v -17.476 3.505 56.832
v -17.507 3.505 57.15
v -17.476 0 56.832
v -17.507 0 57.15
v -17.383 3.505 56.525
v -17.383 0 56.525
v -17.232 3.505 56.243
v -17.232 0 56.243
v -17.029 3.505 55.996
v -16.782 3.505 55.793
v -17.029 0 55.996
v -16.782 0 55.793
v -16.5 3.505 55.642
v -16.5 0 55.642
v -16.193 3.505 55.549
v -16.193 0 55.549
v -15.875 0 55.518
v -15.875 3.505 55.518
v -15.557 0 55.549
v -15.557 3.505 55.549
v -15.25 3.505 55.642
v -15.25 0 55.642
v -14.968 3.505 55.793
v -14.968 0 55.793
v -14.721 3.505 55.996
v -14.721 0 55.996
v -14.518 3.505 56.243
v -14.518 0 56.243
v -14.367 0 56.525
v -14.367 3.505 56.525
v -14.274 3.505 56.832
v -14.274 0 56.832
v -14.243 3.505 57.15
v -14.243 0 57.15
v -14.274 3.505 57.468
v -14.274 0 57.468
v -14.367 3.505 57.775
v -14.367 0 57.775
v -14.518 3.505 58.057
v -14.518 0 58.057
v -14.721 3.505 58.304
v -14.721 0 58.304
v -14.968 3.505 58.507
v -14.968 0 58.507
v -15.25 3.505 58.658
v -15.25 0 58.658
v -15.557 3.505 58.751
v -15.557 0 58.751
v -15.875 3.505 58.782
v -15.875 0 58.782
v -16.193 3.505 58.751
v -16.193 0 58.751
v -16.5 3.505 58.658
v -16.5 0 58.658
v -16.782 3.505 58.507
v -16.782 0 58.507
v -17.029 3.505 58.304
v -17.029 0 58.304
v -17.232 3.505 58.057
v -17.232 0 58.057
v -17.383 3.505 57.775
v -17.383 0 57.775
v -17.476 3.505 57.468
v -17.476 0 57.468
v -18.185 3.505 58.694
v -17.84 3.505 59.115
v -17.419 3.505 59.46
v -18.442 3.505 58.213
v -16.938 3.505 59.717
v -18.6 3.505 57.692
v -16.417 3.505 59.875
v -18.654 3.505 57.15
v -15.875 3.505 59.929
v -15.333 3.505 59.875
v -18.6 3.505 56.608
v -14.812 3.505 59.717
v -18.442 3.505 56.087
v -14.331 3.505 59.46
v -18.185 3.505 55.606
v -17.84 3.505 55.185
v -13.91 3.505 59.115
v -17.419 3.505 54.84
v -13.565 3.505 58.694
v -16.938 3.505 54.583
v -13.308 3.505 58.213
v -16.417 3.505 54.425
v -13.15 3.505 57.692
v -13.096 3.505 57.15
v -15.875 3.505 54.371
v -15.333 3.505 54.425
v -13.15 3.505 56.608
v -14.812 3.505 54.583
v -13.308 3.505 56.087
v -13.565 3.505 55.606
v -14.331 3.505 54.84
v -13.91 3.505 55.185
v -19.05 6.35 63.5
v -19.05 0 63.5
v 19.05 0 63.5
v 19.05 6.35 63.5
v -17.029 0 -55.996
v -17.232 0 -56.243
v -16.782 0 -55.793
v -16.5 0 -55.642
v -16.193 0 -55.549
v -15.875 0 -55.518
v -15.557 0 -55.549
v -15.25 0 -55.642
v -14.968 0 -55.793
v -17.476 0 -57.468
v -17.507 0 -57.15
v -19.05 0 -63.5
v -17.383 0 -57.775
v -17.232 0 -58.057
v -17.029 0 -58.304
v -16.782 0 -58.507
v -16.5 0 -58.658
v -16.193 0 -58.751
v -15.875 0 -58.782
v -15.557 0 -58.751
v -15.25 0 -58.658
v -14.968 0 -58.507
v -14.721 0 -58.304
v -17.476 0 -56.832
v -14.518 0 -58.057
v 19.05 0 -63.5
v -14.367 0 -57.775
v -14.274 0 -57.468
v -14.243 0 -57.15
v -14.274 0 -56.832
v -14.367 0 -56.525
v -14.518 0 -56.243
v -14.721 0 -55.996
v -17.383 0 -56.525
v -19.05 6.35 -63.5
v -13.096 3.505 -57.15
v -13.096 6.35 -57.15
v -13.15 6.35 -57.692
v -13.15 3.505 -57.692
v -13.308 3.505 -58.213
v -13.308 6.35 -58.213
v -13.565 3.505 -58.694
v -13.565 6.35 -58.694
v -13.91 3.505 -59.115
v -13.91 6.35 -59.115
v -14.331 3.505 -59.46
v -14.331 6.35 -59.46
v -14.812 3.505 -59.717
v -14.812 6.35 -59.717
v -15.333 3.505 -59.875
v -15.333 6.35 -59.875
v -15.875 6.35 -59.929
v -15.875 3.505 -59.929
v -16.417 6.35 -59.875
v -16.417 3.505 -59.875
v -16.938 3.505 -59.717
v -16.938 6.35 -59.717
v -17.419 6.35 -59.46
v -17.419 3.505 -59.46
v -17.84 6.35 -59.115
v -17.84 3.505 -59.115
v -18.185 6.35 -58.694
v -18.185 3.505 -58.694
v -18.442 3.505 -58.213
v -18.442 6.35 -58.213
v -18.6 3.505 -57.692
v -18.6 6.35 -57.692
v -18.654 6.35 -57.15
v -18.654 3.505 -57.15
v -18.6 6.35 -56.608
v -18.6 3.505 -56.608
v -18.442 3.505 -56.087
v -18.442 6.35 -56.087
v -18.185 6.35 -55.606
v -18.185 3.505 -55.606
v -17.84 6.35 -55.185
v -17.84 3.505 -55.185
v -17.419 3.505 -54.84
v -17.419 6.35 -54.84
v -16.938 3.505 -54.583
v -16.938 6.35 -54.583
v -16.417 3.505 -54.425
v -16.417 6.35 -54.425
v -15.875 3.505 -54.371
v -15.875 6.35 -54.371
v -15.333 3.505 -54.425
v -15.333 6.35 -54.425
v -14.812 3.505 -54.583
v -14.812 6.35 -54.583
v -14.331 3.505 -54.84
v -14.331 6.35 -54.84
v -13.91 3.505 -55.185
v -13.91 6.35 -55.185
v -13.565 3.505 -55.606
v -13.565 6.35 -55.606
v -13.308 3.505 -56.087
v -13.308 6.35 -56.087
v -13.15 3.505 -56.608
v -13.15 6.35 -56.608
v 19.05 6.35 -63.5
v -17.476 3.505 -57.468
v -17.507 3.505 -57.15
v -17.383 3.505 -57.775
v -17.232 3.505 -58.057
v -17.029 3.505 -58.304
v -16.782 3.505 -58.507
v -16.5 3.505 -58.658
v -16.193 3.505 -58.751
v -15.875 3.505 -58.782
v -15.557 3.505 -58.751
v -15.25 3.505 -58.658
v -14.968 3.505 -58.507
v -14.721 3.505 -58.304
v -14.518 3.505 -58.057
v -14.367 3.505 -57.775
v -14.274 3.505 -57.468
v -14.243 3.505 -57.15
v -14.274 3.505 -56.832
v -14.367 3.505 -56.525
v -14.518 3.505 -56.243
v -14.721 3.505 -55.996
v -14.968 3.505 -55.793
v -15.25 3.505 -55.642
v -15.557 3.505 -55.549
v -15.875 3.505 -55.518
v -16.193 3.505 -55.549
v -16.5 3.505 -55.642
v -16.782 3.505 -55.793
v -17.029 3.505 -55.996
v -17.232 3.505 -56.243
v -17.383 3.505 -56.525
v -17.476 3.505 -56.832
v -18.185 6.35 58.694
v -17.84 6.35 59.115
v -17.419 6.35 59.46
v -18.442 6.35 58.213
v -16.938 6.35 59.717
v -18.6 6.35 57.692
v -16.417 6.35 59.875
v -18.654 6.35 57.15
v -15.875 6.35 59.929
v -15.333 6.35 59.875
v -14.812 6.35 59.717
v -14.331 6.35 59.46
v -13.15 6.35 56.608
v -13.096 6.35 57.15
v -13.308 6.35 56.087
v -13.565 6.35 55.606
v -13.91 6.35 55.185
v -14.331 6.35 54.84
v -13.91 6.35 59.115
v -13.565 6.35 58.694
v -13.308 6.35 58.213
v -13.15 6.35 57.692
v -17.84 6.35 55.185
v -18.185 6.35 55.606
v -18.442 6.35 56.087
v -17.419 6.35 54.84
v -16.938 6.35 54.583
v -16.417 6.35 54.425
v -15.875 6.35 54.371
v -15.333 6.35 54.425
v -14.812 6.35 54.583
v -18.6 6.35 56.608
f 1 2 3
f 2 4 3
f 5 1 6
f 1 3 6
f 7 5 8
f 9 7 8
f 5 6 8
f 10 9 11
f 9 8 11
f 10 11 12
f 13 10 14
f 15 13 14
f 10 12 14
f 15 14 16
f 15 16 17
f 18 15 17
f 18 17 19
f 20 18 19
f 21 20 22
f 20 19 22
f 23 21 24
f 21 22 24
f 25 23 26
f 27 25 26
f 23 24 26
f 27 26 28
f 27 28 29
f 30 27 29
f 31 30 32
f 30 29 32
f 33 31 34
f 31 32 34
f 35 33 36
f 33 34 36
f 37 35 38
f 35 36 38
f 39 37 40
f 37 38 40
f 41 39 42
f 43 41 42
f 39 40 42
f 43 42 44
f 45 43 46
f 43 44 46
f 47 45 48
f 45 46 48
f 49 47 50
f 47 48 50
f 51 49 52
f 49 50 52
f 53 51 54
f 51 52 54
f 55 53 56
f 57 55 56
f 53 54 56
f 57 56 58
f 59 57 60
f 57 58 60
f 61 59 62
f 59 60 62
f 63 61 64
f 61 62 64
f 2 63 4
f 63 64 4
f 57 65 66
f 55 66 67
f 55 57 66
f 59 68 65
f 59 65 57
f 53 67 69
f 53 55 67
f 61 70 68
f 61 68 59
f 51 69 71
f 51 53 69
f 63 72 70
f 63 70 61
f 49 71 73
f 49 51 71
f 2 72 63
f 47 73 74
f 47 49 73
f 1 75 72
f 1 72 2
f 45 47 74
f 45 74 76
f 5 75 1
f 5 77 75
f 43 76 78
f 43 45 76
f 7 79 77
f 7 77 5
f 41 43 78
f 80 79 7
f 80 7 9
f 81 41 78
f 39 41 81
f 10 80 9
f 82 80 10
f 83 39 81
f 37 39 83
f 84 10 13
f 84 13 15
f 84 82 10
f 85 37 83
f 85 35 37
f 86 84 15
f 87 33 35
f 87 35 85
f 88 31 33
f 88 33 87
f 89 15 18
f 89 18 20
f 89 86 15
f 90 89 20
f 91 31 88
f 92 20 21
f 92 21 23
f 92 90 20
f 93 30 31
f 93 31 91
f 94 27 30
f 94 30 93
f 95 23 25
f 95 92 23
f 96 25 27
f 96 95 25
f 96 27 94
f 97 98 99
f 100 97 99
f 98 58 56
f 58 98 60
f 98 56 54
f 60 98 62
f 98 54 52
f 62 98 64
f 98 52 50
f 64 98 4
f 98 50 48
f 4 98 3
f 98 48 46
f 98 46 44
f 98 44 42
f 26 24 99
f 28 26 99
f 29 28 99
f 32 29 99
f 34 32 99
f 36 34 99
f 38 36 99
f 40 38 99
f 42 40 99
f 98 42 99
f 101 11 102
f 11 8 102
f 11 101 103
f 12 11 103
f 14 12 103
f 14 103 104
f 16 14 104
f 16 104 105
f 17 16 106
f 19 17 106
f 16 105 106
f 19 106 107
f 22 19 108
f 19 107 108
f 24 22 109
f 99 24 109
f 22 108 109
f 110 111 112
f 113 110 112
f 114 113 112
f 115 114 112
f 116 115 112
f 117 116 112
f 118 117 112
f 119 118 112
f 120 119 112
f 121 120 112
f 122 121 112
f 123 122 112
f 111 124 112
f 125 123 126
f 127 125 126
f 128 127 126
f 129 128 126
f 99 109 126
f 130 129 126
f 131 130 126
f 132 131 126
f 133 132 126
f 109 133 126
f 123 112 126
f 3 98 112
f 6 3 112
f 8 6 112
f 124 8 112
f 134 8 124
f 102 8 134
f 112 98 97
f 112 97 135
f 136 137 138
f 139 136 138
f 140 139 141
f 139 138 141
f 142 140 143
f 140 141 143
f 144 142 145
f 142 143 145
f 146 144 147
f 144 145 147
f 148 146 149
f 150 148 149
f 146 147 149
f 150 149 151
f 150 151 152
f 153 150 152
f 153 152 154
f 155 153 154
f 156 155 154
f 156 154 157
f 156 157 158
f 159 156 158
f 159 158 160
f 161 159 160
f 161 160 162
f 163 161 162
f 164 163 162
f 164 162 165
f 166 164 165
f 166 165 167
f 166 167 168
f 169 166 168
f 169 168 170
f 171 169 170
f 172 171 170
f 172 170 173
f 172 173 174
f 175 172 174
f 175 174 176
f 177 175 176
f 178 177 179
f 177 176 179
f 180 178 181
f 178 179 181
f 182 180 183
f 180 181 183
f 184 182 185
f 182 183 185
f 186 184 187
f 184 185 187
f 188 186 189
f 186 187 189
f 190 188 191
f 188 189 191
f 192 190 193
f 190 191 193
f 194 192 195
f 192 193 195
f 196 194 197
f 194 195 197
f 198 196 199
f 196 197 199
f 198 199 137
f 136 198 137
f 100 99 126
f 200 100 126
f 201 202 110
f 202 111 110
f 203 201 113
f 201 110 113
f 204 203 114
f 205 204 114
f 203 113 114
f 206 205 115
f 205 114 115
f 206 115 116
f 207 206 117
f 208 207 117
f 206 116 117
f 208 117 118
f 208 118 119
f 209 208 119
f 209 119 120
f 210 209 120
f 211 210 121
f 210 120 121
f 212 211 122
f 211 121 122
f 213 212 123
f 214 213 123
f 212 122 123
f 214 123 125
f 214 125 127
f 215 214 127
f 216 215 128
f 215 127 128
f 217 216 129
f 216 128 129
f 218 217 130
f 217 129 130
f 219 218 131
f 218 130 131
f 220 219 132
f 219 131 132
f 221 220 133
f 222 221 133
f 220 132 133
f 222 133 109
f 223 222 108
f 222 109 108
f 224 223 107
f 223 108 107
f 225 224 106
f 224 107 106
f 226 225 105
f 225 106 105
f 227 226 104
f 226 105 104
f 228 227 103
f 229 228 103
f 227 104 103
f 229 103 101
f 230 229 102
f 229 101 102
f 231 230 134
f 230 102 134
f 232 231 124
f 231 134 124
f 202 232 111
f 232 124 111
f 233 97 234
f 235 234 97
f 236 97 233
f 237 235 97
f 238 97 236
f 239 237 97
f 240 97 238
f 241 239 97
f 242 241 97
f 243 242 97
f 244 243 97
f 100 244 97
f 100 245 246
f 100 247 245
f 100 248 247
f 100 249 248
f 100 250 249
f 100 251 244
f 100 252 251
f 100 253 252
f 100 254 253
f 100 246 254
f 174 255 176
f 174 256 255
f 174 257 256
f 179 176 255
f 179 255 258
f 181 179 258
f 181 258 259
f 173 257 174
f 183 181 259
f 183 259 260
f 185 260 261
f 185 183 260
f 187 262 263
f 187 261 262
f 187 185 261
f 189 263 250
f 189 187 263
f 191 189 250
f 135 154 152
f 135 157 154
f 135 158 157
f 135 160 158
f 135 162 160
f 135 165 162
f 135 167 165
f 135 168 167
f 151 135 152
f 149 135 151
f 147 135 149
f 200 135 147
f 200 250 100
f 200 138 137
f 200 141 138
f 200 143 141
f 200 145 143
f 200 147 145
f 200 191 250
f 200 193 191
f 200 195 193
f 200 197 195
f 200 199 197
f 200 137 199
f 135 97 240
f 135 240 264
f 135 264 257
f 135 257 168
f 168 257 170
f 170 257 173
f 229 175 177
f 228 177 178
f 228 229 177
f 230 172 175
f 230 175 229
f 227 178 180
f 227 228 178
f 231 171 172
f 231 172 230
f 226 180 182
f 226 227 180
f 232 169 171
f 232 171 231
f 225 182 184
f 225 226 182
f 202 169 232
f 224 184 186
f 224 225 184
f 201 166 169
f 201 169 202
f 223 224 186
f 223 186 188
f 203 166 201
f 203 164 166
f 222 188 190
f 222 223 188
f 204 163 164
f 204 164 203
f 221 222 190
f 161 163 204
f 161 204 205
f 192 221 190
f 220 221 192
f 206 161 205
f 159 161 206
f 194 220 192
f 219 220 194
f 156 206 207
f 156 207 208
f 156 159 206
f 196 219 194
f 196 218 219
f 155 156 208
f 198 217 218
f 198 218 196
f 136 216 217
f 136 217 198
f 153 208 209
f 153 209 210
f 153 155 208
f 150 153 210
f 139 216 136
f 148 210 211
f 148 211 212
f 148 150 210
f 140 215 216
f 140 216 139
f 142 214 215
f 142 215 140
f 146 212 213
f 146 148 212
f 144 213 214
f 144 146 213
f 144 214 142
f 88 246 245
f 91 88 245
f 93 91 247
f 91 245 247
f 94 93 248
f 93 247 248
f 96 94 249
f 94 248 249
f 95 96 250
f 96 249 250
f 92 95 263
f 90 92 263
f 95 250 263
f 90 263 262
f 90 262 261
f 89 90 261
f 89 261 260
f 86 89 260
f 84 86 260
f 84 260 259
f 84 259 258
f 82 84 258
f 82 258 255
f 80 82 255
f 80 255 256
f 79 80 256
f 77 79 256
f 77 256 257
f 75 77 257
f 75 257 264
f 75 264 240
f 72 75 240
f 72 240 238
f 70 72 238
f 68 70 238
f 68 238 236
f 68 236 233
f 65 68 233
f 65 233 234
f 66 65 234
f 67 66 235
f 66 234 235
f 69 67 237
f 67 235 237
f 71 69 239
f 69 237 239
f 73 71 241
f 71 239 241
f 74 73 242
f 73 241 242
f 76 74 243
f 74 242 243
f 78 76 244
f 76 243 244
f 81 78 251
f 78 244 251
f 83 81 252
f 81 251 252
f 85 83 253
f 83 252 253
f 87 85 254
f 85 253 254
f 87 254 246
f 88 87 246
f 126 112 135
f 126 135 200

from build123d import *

# Parameters (mm, degrees)
SKETCH1_W                                      = 38.1
SKETCH1_H                                      = 127
BOSS_EXTRUDE1_DEPTH                            = 6.35
CBORE_FOR_4_SOCKET_HEAD_CAP_SCREW1_D           = 3.2639
CBORE_FOR_4_SOCKET_HEAD_CAP_SCREW1_CBORE_D     = 5.55752
CBORE_FOR_4_SOCKET_HEAD_CAP_SCREW1_CBORE_DEPTH = 2.8448


with BuildPart() as part:
    # Sketch1 → Boss-Extrude1 (new body)
    with BuildSketch(Plane(origin=(0, 0, 0), x_dir=(1, 0, 0), z_dir=(0, 1, 0))):
        Rectangle(SKETCH1_W, SKETCH1_H)
    extrude(amount=BOSS_EXTRUDE1_DEPTH)

    # CBORE for #4 Socket Head Cap Screw1 (through all)
    with Locations(Plane(origin=(0, 6.35, 0), x_dir=(1, 0, 0), z_dir=(0, 1, 0))):
        with Locations((-15.875, -57.15), (-15.875, 57.15)):
            CounterBoreHole(CBORE_FOR_4_SOCKET_HEAD_CAP_SCREW1_D / 2, CBORE_FOR_4_SOCKET_HEAD_CAP_SCREW1_CBORE_D / 2, CBORE_FOR_4_SOCKET_HEAD_CAP_SCREW1_CBORE_DEPTH)


solid = part.part
